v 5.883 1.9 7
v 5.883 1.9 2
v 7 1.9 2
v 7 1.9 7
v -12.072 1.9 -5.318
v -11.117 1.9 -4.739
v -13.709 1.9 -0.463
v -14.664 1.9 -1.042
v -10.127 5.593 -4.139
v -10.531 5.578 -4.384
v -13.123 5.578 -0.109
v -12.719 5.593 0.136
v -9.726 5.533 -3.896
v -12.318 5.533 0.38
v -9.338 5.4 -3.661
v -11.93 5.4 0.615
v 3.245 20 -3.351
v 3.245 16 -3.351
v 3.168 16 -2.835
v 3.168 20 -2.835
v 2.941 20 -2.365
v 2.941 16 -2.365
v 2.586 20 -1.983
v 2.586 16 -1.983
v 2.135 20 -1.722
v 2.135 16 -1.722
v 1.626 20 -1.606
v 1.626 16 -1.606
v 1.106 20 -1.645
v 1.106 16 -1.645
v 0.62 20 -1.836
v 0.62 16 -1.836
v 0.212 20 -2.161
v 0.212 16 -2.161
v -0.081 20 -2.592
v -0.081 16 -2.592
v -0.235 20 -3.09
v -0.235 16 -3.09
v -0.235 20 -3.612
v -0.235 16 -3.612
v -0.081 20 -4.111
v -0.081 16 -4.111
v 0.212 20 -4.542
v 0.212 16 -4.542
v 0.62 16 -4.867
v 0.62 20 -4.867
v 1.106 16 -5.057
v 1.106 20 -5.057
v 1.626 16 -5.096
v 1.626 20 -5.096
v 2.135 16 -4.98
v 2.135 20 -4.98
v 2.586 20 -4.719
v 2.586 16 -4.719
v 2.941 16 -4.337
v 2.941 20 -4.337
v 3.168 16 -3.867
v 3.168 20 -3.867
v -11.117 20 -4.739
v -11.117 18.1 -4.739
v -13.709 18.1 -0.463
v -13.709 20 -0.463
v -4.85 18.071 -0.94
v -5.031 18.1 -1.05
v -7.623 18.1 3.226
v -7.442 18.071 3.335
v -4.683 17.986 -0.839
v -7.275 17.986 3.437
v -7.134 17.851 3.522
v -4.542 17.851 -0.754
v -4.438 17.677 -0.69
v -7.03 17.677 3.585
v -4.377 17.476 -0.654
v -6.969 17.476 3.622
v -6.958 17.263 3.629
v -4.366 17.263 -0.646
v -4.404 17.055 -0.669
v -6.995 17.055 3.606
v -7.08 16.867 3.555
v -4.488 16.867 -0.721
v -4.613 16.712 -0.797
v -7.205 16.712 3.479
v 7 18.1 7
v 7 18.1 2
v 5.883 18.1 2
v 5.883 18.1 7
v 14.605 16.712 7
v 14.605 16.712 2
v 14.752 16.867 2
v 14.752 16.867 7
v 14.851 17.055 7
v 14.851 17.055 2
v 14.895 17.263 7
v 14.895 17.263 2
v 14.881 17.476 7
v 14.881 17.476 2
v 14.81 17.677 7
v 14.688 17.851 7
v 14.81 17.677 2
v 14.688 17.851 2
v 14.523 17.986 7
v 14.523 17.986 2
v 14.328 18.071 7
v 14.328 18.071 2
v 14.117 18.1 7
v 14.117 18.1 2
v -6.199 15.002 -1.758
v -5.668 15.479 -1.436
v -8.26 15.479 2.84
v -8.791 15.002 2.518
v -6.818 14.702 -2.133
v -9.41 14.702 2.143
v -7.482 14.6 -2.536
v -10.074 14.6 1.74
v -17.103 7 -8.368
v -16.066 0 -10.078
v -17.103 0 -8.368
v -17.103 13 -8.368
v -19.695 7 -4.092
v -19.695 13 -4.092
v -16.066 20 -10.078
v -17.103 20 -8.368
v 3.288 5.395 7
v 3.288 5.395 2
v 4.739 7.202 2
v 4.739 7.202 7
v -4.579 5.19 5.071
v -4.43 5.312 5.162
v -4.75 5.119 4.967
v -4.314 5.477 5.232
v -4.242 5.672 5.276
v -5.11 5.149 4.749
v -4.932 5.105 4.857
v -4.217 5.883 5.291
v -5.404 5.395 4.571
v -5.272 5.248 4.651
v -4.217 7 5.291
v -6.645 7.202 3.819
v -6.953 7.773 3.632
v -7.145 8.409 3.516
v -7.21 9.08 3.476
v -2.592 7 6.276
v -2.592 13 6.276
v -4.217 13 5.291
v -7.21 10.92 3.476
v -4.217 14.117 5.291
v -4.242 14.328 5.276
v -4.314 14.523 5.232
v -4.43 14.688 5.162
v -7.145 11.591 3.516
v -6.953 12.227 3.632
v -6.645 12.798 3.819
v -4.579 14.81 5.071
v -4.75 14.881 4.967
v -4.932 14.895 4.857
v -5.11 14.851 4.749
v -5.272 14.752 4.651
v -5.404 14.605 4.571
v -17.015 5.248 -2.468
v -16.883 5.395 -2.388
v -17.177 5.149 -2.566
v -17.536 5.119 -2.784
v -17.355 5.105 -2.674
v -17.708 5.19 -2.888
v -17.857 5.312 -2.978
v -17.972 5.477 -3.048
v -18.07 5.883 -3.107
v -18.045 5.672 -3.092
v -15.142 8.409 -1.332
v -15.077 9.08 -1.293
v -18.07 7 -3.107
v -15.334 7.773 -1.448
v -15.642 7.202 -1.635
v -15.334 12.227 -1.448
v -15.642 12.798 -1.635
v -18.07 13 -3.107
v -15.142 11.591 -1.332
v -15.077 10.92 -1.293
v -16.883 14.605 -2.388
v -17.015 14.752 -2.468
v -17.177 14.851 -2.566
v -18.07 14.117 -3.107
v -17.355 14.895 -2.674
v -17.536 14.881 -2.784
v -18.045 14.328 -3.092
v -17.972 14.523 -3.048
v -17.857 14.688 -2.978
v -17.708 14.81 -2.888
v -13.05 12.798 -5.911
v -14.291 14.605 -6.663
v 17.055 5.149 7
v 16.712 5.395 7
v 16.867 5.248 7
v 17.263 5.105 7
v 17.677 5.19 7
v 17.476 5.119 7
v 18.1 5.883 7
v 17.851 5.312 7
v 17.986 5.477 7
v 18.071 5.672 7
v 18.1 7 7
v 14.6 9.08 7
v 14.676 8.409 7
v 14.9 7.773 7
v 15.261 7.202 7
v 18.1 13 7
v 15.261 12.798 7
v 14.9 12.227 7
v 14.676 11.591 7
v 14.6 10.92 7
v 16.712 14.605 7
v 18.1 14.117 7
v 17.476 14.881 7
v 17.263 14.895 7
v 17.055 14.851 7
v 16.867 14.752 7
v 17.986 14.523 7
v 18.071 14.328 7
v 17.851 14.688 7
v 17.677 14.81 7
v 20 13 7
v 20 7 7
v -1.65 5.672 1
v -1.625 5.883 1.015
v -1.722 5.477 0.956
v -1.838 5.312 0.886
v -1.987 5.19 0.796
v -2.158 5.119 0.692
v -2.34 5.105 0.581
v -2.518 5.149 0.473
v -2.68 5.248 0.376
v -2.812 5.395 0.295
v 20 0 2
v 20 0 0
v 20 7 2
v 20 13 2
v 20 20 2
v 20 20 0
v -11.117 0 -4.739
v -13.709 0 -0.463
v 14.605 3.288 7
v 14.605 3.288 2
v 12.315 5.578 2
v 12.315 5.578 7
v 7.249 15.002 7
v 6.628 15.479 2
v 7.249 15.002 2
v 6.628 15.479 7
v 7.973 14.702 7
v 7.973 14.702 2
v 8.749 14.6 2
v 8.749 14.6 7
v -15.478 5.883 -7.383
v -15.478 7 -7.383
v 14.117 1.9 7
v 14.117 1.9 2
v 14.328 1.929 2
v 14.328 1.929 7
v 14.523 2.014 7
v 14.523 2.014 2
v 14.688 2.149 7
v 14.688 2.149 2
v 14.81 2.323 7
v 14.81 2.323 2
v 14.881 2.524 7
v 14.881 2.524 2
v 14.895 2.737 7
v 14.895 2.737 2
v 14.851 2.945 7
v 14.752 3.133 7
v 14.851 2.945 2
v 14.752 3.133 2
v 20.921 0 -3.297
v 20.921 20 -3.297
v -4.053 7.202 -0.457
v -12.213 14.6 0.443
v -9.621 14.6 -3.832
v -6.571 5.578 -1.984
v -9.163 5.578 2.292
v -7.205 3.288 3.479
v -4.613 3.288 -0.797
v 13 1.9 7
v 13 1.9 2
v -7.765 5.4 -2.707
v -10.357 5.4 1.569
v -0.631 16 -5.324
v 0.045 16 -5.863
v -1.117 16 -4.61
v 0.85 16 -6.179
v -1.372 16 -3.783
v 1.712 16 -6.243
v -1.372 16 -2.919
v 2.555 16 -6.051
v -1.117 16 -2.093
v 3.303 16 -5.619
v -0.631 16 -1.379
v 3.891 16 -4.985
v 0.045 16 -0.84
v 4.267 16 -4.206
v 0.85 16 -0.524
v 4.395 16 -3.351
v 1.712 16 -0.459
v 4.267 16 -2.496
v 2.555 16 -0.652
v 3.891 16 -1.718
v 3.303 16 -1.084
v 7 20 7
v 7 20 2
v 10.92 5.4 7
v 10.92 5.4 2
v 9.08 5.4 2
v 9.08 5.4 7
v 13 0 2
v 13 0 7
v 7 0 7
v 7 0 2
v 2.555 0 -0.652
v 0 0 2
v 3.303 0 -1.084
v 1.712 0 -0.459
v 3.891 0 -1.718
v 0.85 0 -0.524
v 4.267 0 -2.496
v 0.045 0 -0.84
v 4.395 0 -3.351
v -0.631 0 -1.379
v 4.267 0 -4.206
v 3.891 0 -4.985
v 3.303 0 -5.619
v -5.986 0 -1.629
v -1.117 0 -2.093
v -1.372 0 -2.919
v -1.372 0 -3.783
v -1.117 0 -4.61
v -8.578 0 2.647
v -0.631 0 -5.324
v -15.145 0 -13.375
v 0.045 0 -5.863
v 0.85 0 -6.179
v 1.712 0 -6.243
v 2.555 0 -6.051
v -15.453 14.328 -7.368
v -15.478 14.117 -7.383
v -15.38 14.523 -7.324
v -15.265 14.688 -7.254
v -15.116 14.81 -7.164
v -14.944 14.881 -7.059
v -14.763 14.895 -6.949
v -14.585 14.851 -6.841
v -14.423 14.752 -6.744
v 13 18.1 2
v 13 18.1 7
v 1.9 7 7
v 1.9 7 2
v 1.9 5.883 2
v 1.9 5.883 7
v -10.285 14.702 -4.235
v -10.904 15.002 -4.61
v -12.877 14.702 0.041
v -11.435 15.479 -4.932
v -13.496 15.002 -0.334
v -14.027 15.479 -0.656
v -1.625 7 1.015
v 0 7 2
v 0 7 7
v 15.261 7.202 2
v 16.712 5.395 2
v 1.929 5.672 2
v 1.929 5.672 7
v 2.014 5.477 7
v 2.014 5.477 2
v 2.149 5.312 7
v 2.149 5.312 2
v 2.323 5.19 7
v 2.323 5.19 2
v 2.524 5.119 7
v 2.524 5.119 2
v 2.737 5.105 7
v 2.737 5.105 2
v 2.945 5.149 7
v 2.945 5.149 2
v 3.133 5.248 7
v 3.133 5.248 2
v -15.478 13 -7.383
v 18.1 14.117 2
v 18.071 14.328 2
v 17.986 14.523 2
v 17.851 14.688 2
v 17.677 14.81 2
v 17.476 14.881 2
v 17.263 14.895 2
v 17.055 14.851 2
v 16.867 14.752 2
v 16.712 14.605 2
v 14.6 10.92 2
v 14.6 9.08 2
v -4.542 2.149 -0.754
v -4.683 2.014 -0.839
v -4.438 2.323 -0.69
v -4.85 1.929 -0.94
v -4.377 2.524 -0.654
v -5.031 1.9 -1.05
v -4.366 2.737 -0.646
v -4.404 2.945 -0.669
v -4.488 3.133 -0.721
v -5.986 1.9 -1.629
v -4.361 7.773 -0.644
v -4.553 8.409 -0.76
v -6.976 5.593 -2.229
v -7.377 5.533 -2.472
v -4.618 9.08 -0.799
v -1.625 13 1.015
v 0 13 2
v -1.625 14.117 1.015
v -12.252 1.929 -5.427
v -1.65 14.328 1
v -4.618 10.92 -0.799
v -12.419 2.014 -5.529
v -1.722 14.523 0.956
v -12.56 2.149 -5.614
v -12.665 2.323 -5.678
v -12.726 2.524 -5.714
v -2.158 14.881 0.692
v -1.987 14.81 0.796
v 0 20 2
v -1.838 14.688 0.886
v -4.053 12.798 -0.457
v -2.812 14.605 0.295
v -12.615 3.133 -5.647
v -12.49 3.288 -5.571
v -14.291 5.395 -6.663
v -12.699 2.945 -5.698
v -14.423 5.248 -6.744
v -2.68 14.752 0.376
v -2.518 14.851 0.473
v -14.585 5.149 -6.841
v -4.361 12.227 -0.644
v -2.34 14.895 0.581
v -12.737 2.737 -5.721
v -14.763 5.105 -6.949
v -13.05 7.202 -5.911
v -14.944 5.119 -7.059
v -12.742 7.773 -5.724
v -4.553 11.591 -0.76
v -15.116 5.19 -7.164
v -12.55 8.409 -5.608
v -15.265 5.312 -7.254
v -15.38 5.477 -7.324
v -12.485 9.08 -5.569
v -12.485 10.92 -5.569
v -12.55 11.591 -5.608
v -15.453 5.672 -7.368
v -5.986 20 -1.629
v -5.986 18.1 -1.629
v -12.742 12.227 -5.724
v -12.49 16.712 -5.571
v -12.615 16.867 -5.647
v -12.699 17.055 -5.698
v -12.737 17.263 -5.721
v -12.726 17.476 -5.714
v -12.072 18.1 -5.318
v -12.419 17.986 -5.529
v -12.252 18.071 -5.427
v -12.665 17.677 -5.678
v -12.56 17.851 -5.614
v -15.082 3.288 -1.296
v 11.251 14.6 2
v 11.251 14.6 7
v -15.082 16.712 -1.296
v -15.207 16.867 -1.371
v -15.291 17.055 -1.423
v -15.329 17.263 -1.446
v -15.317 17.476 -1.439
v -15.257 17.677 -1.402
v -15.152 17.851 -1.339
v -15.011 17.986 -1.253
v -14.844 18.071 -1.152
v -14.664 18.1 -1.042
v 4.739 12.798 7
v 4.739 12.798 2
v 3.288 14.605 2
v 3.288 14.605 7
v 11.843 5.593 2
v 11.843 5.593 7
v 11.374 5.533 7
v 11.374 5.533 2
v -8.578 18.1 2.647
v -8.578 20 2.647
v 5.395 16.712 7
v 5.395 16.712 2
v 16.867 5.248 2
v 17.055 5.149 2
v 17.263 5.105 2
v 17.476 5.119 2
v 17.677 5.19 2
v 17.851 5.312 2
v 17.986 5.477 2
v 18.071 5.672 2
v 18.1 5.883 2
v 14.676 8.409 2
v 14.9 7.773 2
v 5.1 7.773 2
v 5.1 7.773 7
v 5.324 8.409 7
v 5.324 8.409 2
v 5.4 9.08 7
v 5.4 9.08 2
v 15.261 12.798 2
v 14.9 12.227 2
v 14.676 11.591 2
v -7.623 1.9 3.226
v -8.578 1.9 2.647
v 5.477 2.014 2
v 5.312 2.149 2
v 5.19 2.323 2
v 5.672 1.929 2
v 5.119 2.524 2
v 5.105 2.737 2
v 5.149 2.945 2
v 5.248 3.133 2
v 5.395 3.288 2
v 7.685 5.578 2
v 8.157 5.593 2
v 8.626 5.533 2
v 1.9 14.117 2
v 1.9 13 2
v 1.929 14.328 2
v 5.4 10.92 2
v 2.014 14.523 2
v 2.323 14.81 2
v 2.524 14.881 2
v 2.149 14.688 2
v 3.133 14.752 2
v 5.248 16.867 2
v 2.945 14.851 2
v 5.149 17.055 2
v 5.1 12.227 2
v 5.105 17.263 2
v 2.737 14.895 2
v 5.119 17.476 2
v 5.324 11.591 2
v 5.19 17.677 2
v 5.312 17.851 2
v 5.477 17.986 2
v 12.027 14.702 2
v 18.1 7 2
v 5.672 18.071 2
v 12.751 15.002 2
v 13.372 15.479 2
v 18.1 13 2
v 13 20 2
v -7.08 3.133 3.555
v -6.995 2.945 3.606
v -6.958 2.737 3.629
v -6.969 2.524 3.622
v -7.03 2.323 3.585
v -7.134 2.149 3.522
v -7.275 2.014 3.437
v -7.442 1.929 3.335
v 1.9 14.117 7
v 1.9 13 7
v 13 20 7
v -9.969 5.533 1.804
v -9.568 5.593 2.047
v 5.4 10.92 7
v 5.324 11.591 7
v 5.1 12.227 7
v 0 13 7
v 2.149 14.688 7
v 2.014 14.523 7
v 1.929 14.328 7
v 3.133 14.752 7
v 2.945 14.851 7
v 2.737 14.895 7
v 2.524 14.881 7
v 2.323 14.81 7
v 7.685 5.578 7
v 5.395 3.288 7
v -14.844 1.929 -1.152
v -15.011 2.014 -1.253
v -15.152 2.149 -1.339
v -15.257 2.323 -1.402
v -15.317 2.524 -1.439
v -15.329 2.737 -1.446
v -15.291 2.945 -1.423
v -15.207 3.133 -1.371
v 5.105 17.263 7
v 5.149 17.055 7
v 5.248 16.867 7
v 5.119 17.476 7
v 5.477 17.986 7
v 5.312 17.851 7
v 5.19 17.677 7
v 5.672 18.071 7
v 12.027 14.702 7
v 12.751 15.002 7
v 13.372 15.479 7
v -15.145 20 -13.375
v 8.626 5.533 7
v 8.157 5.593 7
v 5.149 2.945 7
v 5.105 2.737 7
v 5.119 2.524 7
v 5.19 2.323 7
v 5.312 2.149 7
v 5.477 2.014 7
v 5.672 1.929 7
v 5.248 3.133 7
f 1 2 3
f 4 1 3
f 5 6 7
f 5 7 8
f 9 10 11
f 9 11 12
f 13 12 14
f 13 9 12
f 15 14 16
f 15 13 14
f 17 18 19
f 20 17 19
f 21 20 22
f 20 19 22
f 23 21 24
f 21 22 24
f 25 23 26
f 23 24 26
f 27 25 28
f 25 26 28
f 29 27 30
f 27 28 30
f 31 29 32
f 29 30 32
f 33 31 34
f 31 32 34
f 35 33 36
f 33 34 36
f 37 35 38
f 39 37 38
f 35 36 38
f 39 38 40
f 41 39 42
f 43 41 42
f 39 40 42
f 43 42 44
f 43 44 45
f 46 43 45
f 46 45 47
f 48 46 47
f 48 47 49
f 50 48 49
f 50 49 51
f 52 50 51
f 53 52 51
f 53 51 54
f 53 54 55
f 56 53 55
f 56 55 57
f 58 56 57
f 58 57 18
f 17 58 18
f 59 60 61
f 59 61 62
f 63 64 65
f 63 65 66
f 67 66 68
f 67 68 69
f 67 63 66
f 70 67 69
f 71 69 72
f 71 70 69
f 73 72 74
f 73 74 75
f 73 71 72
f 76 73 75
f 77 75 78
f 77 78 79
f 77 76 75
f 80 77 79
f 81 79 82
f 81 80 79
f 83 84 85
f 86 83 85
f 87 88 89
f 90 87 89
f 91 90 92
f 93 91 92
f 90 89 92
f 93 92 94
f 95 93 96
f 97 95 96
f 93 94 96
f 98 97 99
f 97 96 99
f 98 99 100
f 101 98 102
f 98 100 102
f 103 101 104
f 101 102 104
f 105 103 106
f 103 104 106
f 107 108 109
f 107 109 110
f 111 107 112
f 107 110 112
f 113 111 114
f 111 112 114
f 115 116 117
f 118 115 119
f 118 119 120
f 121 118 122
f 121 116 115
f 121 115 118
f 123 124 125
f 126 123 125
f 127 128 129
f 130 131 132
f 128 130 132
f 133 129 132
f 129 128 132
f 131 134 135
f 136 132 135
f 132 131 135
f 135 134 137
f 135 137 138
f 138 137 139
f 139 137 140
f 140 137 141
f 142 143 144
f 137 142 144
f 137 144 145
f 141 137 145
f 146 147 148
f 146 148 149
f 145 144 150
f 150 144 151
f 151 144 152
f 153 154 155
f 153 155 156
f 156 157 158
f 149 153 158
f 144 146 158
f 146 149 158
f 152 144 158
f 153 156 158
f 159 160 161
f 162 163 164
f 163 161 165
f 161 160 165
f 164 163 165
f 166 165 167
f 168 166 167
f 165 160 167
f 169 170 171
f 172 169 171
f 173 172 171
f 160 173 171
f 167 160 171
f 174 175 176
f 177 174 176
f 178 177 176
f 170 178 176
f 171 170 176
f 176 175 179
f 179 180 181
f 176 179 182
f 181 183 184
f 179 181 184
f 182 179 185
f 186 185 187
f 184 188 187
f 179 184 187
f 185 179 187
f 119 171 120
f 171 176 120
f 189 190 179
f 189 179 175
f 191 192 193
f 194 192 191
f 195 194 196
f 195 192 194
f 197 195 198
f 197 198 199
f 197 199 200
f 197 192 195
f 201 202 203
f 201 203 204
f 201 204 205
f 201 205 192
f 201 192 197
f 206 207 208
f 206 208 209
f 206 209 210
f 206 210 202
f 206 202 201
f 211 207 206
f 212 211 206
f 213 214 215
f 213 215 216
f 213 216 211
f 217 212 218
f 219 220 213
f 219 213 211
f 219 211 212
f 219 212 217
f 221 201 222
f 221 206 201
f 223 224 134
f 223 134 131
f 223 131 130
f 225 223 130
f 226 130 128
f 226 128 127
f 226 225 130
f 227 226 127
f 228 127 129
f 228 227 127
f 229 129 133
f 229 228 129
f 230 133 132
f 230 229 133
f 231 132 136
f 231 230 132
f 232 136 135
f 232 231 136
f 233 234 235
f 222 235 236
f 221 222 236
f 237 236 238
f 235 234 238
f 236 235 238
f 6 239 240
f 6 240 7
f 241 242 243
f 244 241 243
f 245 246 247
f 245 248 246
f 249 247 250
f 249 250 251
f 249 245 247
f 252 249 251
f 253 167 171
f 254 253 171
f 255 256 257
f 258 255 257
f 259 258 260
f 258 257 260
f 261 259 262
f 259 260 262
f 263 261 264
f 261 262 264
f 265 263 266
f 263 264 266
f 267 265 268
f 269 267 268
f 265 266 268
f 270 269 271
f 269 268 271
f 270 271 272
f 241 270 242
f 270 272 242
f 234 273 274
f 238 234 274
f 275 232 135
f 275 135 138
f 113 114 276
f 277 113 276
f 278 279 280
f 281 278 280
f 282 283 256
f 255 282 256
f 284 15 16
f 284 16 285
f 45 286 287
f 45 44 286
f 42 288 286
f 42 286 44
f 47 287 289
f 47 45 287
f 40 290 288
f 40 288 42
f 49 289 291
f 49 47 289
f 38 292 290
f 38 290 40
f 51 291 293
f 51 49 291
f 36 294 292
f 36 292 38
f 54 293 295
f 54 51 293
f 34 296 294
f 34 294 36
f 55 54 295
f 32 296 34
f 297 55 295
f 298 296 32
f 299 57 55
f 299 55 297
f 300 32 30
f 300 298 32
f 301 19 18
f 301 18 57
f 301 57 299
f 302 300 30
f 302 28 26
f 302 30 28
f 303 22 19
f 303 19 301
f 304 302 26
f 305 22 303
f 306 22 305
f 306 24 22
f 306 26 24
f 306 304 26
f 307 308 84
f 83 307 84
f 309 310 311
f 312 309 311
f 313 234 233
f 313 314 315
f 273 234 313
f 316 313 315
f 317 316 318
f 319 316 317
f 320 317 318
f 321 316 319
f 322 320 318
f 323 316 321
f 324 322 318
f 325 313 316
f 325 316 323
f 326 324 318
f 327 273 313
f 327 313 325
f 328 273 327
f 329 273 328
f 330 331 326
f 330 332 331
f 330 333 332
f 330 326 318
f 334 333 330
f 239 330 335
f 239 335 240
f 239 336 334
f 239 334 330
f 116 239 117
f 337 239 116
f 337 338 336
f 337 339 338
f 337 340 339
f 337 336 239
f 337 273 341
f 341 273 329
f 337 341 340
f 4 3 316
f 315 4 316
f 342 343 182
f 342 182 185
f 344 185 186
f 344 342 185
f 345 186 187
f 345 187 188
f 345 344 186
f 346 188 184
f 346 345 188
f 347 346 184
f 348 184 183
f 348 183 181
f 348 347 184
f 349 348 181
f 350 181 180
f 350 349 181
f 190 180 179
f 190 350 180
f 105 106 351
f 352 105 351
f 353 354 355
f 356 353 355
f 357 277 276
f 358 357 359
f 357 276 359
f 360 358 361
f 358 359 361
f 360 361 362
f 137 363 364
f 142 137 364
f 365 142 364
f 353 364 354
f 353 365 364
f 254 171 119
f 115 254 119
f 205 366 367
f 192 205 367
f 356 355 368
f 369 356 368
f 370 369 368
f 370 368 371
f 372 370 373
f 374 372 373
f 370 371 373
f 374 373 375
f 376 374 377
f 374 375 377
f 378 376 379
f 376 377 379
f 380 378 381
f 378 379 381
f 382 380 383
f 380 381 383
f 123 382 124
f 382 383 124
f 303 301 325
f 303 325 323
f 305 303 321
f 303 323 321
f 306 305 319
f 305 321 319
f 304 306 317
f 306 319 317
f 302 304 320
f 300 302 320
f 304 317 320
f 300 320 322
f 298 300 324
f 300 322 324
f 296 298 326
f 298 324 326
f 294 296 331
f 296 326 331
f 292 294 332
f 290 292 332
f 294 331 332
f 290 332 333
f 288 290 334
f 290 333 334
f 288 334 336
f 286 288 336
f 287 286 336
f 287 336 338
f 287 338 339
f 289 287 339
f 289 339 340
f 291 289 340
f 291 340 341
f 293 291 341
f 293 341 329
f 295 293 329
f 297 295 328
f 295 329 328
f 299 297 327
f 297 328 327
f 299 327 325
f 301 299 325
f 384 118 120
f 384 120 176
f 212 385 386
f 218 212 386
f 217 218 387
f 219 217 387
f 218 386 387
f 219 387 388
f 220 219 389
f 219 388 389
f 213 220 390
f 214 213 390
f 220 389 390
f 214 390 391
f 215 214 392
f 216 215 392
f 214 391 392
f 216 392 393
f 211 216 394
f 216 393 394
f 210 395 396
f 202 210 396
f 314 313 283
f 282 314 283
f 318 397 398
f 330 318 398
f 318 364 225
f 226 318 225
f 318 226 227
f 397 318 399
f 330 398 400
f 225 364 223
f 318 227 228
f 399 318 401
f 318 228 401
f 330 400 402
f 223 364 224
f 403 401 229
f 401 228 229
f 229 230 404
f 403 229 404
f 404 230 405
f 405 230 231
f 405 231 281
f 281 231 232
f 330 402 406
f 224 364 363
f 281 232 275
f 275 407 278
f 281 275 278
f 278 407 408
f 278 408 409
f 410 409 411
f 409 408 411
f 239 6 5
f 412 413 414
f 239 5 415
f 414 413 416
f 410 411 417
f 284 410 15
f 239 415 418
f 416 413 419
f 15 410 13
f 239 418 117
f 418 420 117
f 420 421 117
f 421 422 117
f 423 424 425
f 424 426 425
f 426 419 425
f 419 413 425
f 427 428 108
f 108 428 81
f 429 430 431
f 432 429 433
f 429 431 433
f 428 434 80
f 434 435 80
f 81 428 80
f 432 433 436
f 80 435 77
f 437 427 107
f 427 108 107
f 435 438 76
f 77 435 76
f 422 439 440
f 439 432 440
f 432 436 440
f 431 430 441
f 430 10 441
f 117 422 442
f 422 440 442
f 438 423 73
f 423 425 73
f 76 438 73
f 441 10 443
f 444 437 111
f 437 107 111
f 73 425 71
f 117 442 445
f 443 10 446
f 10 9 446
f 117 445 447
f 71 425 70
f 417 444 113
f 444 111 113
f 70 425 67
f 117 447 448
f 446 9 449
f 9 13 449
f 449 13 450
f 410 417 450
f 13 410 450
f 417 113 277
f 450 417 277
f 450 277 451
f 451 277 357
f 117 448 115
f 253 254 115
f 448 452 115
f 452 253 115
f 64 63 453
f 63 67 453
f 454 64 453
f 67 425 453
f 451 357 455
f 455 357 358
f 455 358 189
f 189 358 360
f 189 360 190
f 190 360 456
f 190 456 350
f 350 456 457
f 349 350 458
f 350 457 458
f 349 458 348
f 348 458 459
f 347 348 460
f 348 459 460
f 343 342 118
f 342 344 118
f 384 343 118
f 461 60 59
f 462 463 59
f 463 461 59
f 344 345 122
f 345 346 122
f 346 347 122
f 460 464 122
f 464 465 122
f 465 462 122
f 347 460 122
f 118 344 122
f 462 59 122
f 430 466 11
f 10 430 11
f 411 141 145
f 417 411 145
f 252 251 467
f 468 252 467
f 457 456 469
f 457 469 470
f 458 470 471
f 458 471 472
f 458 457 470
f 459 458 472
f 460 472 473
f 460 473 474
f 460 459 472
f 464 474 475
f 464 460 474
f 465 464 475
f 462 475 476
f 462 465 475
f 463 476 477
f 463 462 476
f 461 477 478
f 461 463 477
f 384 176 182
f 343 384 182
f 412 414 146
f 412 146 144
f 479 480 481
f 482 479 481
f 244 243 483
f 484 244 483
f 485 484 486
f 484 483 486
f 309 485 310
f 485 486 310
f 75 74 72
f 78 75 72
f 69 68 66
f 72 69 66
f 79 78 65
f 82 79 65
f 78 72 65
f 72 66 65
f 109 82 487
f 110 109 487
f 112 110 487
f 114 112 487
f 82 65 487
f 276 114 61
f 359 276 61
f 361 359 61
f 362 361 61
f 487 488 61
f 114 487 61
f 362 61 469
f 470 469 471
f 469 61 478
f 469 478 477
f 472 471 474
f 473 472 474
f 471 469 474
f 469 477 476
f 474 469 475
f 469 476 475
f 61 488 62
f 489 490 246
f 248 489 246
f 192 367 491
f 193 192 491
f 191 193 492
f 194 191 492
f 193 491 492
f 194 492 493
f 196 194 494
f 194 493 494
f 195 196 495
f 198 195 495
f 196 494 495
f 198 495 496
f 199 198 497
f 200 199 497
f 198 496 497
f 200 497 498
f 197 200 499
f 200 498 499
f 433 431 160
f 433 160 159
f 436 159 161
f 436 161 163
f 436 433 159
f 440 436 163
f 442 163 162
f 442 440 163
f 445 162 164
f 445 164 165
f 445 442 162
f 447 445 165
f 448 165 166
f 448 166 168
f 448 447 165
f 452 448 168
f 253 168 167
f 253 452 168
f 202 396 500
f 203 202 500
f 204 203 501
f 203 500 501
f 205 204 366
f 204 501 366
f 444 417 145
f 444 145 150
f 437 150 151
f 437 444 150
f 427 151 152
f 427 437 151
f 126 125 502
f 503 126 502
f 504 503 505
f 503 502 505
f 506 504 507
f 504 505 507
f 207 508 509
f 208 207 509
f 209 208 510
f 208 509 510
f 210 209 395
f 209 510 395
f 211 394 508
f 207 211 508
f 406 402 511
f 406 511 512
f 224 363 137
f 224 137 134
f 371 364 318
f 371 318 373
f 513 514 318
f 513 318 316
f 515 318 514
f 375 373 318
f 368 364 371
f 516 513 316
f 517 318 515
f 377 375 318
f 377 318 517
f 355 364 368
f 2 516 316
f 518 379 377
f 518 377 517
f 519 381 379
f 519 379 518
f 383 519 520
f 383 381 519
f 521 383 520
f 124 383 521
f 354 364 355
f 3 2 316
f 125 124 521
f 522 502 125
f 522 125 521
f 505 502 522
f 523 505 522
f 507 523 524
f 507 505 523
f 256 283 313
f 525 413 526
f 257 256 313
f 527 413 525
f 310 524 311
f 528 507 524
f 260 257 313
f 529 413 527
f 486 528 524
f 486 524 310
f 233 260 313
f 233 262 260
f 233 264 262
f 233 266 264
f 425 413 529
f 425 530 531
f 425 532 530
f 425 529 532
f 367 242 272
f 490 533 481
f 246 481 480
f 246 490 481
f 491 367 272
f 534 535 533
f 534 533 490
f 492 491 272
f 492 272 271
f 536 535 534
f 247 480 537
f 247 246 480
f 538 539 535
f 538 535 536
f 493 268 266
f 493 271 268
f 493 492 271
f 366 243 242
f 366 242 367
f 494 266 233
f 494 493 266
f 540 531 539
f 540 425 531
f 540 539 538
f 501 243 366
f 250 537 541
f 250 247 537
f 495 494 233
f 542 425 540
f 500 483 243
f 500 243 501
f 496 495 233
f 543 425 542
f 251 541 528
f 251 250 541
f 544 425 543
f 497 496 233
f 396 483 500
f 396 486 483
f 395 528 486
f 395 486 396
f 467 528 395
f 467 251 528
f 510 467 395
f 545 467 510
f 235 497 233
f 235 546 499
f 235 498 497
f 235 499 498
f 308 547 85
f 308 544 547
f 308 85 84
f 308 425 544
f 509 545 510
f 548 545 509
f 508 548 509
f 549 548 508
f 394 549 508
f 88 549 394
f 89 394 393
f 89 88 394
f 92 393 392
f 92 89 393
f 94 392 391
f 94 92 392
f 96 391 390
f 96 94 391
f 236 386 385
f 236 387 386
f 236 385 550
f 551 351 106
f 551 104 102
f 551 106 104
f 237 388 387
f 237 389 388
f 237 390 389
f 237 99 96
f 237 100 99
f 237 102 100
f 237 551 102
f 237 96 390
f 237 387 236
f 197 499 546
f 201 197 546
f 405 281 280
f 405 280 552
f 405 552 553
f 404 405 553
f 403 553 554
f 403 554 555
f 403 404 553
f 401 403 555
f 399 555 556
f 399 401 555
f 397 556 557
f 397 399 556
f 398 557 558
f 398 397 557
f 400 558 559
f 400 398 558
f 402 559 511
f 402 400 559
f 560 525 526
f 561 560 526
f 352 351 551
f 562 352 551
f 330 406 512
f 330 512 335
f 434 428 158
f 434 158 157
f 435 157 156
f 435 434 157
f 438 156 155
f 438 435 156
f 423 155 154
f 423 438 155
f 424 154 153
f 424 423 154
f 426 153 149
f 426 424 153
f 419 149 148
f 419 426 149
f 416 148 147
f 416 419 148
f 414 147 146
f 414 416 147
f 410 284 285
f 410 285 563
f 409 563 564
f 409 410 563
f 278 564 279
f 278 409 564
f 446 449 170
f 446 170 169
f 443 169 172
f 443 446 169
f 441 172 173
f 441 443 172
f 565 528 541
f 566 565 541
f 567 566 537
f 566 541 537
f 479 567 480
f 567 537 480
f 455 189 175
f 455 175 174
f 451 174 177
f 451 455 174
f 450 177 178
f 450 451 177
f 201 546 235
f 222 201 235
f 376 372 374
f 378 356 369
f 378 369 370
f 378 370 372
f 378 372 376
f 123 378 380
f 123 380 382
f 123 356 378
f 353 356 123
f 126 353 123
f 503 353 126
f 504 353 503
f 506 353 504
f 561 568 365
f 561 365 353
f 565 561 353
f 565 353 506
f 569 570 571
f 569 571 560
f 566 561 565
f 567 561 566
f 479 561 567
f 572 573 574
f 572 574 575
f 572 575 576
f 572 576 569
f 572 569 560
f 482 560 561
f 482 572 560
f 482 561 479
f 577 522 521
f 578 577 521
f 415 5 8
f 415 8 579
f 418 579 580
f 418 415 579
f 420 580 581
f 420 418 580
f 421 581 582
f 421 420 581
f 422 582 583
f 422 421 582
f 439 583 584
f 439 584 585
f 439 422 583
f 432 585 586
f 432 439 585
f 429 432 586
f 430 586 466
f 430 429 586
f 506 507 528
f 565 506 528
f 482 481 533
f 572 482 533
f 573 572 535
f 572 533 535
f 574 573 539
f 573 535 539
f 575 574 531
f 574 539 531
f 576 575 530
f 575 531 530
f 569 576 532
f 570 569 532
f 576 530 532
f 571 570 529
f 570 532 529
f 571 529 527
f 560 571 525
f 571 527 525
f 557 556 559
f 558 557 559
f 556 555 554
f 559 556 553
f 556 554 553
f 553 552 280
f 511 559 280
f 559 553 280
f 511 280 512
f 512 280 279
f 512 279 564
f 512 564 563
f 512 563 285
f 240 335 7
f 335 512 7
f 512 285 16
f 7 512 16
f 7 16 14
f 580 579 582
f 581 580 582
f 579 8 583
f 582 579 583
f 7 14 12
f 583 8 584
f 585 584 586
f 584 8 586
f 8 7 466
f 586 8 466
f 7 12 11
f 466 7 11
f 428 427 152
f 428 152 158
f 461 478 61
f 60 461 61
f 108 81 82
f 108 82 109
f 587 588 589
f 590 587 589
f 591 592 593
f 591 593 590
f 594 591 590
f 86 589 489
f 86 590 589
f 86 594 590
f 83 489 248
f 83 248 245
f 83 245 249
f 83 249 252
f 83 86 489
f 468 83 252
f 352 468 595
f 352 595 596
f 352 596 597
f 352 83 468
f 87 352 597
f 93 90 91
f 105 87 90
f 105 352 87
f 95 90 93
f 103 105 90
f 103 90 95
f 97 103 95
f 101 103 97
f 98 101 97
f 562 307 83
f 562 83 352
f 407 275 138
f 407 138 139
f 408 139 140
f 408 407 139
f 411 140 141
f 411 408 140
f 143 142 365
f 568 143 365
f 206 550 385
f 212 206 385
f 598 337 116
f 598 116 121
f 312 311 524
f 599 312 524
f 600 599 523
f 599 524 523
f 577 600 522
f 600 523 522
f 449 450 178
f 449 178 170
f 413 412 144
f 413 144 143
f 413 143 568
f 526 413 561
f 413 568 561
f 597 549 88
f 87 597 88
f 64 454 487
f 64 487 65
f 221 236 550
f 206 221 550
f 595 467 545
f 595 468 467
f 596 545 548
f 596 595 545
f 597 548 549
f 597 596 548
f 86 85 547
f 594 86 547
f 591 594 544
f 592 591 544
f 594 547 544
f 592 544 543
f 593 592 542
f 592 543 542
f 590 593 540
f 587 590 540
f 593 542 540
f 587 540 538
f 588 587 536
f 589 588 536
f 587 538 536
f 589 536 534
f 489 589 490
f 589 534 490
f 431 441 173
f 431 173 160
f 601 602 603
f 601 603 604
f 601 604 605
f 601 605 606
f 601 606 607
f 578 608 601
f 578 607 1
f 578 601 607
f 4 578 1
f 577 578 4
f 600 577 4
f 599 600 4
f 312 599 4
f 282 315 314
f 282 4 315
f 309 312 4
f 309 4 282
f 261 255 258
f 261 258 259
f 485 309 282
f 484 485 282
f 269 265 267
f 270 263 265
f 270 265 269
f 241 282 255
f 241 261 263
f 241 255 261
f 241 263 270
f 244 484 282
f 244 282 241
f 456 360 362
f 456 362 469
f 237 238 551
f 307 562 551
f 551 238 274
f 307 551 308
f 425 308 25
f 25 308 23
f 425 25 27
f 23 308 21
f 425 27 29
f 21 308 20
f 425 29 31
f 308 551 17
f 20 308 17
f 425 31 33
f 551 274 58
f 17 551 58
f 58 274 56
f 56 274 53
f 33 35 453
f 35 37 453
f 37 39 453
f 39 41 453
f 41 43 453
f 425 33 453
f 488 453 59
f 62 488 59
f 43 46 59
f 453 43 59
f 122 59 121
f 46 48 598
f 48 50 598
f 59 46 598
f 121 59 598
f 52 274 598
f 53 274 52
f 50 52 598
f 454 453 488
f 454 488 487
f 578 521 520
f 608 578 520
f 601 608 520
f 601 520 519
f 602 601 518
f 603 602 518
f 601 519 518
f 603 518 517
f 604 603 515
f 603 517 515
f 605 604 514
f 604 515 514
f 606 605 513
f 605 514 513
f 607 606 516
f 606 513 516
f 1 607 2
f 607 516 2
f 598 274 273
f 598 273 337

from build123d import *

# Parameters (mm, degrees)
SKIZZE1_W                       = 20
SKIZZE1_H                       = 20
AUFSATZ_LINEAR_AUSTRAGEN1_DEPTH = 2
AUFSATZ_LINEAR_AUSTRAGEN3_DEPTH = 5
VERRUNDUNG1_R                   = 3
VERRUNDUNG1_OF_SPIEGELN1_R      = 3
AUFSATZ_LINEAR_AUSTRAGEN4_REACH = 22.848
SKIZZE3_W                       = 37.447689889
SKIZZE3_H                       = 20
SKIZZE4_R                       = 1.75
SCHNITT_LINEAR_AUSTRAGEN1_DEPTH = 21
SKIZZE4_3_R                     = 2.9
SKIZZE4_3_R_2                   = 1.75
SCHNITT_LINEAR_AUSTRAGEN2_DEPTH = 16
AUFSATZ_LINEAR_AUSTRAGEN5_REACH = 27.254
SKIZZE5_W                       = 2.691263413
SKIZZE5_H                       = 6


with BuildPart() as part:
    # Skizze1 → Aufsatz-Linear austragen1 (new body)
    with BuildSketch(Plane.XY):
        with Locations((10, 10)):
            Rectangle(SKIZZE1_W, SKIZZE1_H)
    aufsatz_linear_austragen1 = extrude(amount=AUFSATZ_LINEAR_AUSTRAGEN1_DEPTH)

    # Skizze2 → Aufsatz-Linear austragen3 (add)
    with BuildSketch(Plane.XY.offset(2)):
        with BuildLine():
            Line((13, 18.1), (13, 20))
            Line((13, 20), (7, 20))
            Line((7, 20), (7, 18.1))
            Line((7, 18.1), (5.883086579, 18.1))
            ThreePointArc((5.883086579, 18.1), (5.147285539, 17.57883746), (5.394745881, 16.711786745))
            Line((5.394745881, 16.711786745), (7.506532626, 14.6))
            Line((7.506532626, 14.6), (9.080240322, 14.6))
            Line((9.080240322, 14.6), (10.919759678, 14.6))
            Line((10.919759678, 14.6), (12.493467374, 14.6))
            Line((12.493467374, 14.6), (14.605254119, 16.711786745))
            ThreePointArc((14.605254119, 16.711786745), (14.852714461, 17.57883746), (14.116913421, 18.1))
            Line((14.116913421, 18.1), (13, 18.1))
        make_face()
        with BuildLine():
            Line((1.9, 13), (0, 13))
            Line((0, 13), (0, 7))
            Line((0, 7), (1.9, 7))
            Line((1.9, 7), (1.9, 5.883086579))
            ThreePointArc((1.9, 5.883086579), (2.42116254, 5.147285539), (3.288213255, 5.394745881))
            Line((3.288213255, 5.394745881), (4.739281749, 7.20200687))
            ThreePointArc((4.739281749, 7.20200687), (5.230003997, 8.08471163), (5.4, 9.080240322))
            Line((5.4, 9.080240322), (5.4, 10.919759678))
            ThreePointArc((5.4, 10.919759678), (5.230003997, 11.91528837), (4.739281749, 12.79799313))
            Line((4.739281749, 12.79799313), (3.288213255, 14.605254119))
            ThreePointArc((3.288213255, 14.605254119), (2.42116254, 14.852714461), (1.9, 14.116913421))
            Line((1.9, 14.116913421), (1.9, 13))
        make_face()
        with BuildLine():
            Line((7, 0), (13, 0))
            Line((13, 0), (13, 1.9))
            Line((13, 1.9), (14.116913421, 1.9))
            ThreePointArc((14.116913421, 1.9), (14.852714461, 2.42116254), (14.605254119, 3.288213255))
            Line((14.605254119, 3.288213255), (12.315477065, 5.577990309))
            ThreePointArc((12.315477065, 5.577990309), (11.607035992, 5.571977263), (10.919759678, 5.4))
            Line((10.919759678, 5.4), (9.080240322, 5.4))
            ThreePointArc((9.080240322, 5.4), (8.392964008, 5.571977263), (7.684522935, 5.577990309))
            Line((7.684522935, 5.577990309), (5.394745881, 3.288213255))
            ThreePointArc((5.394745881, 3.288213255), (5.147285539, 2.42116254), (5.883086579, 1.9))
            Line((5.883086579, 1.9), (7, 1.9))
            Line((7, 1.9), (7, 0))
        make_face()
        with BuildLine():
            Line((20, 7), (20, 13))
            Line((20, 13), (18.1, 13))
            Line((18.1, 13), (18.1, 14.116913421))
            ThreePointArc((18.1, 14.116913421), (17.57883746, 14.852714461), (16.711786745, 14.605254119))
            Line((16.711786745, 14.605254119), (15.260718251, 12.79799313))
            ThreePointArc((15.260718251, 12.79799313), (14.769996003, 11.91528837), (14.6, 10.919759678))
            Line((14.6, 10.919759678), (14.6, 9.080240322))
            ThreePointArc((14.6, 9.080240322), (14.769996003, 8.08471163), (15.260718251, 7.20200687))
            Line((15.260718251, 7.20200687), (16.711786745, 5.394745881))
            ThreePointArc((16.711786745, 5.394745881), (17.57883746, 5.147285539), (18.1, 5.883086579))
            Line((18.1, 5.883086579), (18.1, 7))
            Line((18.1, 7), (20, 7))
        make_face()
    aufsatz_linear_austragen3 = extrude(amount=AUFSATZ_LINEAR_AUSTRAGEN3_DEPTH)

    # Verrundung1
    verrundung1_edges = [part.edges().sort_by_distance(p)[0] for p in [
        (7.506532626, 14.6, 4.5),
        (12.493467374, 14.6, 4.5),
    ]]
    fillet(verrundung1_edges, radius=VERRUNDUNG1_R)

    # Spiegeln1: Aufsatz-Linear austragen1, Aufsatz-Linear austragen3 across plane
    add(aufsatz_linear_austragen1.mirror(Plane(origin=(0.518393786, 0, 0.144857975), x_dir=(-0.269126341, 0, 0.963104881), z_dir=(-0.963104881, 0, -0.269126341))))
    add(aufsatz_linear_austragen3.mirror(Plane(origin=(0.518393786, 0, 0.144857975), x_dir=(-0.269126341, 0, 0.963104881), z_dir=(-0.963104881, 0, -0.269126341))))

    # Verrundung1 of Spiegeln1
    verrundung1_of_spiegeln1_edges = [part.edges().sort_by_distance(p)[0] for p in [
        (-7.715135975, 14.6, 0.246515195),
        (-11.979673452, 14.6, -2.338680788),
    ]]
    fillet(verrundung1_of_spiegeln1_edges, radius=VERRUNDUNG1_OF_SPIEGELN1_R)

    # Skizze3 → Aufsatz-Linear austragen4 (add, up to next)
    with BuildSketch(Plane(origin=(2.36988033, 0, -8.480936141), x_dir=(-0.963104881, 0, -0.269126341), z_dir=(0.269126341, 0, -0.963104881)), mode=Mode.PRIVATE) as aufsatz_linear_austragen4_sk1:
        with Locations((-0.538252683, 10)):
            Rectangle(SKIZZE3_W, SKIZZE3_H)
    aufsatz_linear_austragen4_tool1 = extrude(aufsatz_linear_austragen4_sk1.sketch, amount=-AUFSATZ_LINEAR_AUSTRAGEN4_REACH, mode=Mode.PRIVATE) - part.part
    add(aufsatz_linear_austragen4_tool1.solids().sort_by_distance((2.888274, 10, -8.336078))[0])

    # Skizze4 → Schnitt-Linear austragen1 (cut, through all)
    with BuildSketch(Plane.XZ):
        with Locations((1.495339923, -3.351275437)):
            Circle(SKIZZE4_R)
    extrude(amount=-SCHNITT_LINEAR_AUSTRAGEN1_DEPTH, mode=Mode.SUBTRACT)

    # Skizze4<3> → Schnitt-Linear austragen2 (cut)
    with BuildSketch(Plane.XZ):
        with Locations((1.495339923, -3.351275437)):
            Circle(SKIZZE4_3_R)
        with Locations((1.495339923, -3.351275437)):
            Circle(SKIZZE4_3_R_2, mode=Mode.SUBTRACT)
    extrude(amount=-SCHNITT_LINEAR_AUSTRAGEN2_DEPTH, mode=Mode.SUBTRACT)

    # Skizze5 → Aufsatz-Linear austragen5 (add, up to next)
    with BuildSketch(Plane(origin=(-1.814378251, 0, 6.492997087), x_dir=(0.963104881, 0, 0.269126341), z_dir=(-0.269126341, 0, 0.963104881)), mode=Mode.PRIVATE) as aufsatz_linear_austragen5_sk1:
        with Locations((0.538252683, 10)):
            Rectangle(SKIZZE5_W, SKIZZE5_H)
    aufsatz_linear_austragen5_tool1 = extrude(aufsatz_linear_austragen5_sk1.sketch, amount=-AUFSATZ_LINEAR_AUSTRAGEN5_REACH, mode=Mode.PRIVATE) - part.part
    add(aufsatz_linear_austragen5_tool1.solids().sort_by_distance((-1.295984, 10, 6.637855))[0])


solid = part.part
